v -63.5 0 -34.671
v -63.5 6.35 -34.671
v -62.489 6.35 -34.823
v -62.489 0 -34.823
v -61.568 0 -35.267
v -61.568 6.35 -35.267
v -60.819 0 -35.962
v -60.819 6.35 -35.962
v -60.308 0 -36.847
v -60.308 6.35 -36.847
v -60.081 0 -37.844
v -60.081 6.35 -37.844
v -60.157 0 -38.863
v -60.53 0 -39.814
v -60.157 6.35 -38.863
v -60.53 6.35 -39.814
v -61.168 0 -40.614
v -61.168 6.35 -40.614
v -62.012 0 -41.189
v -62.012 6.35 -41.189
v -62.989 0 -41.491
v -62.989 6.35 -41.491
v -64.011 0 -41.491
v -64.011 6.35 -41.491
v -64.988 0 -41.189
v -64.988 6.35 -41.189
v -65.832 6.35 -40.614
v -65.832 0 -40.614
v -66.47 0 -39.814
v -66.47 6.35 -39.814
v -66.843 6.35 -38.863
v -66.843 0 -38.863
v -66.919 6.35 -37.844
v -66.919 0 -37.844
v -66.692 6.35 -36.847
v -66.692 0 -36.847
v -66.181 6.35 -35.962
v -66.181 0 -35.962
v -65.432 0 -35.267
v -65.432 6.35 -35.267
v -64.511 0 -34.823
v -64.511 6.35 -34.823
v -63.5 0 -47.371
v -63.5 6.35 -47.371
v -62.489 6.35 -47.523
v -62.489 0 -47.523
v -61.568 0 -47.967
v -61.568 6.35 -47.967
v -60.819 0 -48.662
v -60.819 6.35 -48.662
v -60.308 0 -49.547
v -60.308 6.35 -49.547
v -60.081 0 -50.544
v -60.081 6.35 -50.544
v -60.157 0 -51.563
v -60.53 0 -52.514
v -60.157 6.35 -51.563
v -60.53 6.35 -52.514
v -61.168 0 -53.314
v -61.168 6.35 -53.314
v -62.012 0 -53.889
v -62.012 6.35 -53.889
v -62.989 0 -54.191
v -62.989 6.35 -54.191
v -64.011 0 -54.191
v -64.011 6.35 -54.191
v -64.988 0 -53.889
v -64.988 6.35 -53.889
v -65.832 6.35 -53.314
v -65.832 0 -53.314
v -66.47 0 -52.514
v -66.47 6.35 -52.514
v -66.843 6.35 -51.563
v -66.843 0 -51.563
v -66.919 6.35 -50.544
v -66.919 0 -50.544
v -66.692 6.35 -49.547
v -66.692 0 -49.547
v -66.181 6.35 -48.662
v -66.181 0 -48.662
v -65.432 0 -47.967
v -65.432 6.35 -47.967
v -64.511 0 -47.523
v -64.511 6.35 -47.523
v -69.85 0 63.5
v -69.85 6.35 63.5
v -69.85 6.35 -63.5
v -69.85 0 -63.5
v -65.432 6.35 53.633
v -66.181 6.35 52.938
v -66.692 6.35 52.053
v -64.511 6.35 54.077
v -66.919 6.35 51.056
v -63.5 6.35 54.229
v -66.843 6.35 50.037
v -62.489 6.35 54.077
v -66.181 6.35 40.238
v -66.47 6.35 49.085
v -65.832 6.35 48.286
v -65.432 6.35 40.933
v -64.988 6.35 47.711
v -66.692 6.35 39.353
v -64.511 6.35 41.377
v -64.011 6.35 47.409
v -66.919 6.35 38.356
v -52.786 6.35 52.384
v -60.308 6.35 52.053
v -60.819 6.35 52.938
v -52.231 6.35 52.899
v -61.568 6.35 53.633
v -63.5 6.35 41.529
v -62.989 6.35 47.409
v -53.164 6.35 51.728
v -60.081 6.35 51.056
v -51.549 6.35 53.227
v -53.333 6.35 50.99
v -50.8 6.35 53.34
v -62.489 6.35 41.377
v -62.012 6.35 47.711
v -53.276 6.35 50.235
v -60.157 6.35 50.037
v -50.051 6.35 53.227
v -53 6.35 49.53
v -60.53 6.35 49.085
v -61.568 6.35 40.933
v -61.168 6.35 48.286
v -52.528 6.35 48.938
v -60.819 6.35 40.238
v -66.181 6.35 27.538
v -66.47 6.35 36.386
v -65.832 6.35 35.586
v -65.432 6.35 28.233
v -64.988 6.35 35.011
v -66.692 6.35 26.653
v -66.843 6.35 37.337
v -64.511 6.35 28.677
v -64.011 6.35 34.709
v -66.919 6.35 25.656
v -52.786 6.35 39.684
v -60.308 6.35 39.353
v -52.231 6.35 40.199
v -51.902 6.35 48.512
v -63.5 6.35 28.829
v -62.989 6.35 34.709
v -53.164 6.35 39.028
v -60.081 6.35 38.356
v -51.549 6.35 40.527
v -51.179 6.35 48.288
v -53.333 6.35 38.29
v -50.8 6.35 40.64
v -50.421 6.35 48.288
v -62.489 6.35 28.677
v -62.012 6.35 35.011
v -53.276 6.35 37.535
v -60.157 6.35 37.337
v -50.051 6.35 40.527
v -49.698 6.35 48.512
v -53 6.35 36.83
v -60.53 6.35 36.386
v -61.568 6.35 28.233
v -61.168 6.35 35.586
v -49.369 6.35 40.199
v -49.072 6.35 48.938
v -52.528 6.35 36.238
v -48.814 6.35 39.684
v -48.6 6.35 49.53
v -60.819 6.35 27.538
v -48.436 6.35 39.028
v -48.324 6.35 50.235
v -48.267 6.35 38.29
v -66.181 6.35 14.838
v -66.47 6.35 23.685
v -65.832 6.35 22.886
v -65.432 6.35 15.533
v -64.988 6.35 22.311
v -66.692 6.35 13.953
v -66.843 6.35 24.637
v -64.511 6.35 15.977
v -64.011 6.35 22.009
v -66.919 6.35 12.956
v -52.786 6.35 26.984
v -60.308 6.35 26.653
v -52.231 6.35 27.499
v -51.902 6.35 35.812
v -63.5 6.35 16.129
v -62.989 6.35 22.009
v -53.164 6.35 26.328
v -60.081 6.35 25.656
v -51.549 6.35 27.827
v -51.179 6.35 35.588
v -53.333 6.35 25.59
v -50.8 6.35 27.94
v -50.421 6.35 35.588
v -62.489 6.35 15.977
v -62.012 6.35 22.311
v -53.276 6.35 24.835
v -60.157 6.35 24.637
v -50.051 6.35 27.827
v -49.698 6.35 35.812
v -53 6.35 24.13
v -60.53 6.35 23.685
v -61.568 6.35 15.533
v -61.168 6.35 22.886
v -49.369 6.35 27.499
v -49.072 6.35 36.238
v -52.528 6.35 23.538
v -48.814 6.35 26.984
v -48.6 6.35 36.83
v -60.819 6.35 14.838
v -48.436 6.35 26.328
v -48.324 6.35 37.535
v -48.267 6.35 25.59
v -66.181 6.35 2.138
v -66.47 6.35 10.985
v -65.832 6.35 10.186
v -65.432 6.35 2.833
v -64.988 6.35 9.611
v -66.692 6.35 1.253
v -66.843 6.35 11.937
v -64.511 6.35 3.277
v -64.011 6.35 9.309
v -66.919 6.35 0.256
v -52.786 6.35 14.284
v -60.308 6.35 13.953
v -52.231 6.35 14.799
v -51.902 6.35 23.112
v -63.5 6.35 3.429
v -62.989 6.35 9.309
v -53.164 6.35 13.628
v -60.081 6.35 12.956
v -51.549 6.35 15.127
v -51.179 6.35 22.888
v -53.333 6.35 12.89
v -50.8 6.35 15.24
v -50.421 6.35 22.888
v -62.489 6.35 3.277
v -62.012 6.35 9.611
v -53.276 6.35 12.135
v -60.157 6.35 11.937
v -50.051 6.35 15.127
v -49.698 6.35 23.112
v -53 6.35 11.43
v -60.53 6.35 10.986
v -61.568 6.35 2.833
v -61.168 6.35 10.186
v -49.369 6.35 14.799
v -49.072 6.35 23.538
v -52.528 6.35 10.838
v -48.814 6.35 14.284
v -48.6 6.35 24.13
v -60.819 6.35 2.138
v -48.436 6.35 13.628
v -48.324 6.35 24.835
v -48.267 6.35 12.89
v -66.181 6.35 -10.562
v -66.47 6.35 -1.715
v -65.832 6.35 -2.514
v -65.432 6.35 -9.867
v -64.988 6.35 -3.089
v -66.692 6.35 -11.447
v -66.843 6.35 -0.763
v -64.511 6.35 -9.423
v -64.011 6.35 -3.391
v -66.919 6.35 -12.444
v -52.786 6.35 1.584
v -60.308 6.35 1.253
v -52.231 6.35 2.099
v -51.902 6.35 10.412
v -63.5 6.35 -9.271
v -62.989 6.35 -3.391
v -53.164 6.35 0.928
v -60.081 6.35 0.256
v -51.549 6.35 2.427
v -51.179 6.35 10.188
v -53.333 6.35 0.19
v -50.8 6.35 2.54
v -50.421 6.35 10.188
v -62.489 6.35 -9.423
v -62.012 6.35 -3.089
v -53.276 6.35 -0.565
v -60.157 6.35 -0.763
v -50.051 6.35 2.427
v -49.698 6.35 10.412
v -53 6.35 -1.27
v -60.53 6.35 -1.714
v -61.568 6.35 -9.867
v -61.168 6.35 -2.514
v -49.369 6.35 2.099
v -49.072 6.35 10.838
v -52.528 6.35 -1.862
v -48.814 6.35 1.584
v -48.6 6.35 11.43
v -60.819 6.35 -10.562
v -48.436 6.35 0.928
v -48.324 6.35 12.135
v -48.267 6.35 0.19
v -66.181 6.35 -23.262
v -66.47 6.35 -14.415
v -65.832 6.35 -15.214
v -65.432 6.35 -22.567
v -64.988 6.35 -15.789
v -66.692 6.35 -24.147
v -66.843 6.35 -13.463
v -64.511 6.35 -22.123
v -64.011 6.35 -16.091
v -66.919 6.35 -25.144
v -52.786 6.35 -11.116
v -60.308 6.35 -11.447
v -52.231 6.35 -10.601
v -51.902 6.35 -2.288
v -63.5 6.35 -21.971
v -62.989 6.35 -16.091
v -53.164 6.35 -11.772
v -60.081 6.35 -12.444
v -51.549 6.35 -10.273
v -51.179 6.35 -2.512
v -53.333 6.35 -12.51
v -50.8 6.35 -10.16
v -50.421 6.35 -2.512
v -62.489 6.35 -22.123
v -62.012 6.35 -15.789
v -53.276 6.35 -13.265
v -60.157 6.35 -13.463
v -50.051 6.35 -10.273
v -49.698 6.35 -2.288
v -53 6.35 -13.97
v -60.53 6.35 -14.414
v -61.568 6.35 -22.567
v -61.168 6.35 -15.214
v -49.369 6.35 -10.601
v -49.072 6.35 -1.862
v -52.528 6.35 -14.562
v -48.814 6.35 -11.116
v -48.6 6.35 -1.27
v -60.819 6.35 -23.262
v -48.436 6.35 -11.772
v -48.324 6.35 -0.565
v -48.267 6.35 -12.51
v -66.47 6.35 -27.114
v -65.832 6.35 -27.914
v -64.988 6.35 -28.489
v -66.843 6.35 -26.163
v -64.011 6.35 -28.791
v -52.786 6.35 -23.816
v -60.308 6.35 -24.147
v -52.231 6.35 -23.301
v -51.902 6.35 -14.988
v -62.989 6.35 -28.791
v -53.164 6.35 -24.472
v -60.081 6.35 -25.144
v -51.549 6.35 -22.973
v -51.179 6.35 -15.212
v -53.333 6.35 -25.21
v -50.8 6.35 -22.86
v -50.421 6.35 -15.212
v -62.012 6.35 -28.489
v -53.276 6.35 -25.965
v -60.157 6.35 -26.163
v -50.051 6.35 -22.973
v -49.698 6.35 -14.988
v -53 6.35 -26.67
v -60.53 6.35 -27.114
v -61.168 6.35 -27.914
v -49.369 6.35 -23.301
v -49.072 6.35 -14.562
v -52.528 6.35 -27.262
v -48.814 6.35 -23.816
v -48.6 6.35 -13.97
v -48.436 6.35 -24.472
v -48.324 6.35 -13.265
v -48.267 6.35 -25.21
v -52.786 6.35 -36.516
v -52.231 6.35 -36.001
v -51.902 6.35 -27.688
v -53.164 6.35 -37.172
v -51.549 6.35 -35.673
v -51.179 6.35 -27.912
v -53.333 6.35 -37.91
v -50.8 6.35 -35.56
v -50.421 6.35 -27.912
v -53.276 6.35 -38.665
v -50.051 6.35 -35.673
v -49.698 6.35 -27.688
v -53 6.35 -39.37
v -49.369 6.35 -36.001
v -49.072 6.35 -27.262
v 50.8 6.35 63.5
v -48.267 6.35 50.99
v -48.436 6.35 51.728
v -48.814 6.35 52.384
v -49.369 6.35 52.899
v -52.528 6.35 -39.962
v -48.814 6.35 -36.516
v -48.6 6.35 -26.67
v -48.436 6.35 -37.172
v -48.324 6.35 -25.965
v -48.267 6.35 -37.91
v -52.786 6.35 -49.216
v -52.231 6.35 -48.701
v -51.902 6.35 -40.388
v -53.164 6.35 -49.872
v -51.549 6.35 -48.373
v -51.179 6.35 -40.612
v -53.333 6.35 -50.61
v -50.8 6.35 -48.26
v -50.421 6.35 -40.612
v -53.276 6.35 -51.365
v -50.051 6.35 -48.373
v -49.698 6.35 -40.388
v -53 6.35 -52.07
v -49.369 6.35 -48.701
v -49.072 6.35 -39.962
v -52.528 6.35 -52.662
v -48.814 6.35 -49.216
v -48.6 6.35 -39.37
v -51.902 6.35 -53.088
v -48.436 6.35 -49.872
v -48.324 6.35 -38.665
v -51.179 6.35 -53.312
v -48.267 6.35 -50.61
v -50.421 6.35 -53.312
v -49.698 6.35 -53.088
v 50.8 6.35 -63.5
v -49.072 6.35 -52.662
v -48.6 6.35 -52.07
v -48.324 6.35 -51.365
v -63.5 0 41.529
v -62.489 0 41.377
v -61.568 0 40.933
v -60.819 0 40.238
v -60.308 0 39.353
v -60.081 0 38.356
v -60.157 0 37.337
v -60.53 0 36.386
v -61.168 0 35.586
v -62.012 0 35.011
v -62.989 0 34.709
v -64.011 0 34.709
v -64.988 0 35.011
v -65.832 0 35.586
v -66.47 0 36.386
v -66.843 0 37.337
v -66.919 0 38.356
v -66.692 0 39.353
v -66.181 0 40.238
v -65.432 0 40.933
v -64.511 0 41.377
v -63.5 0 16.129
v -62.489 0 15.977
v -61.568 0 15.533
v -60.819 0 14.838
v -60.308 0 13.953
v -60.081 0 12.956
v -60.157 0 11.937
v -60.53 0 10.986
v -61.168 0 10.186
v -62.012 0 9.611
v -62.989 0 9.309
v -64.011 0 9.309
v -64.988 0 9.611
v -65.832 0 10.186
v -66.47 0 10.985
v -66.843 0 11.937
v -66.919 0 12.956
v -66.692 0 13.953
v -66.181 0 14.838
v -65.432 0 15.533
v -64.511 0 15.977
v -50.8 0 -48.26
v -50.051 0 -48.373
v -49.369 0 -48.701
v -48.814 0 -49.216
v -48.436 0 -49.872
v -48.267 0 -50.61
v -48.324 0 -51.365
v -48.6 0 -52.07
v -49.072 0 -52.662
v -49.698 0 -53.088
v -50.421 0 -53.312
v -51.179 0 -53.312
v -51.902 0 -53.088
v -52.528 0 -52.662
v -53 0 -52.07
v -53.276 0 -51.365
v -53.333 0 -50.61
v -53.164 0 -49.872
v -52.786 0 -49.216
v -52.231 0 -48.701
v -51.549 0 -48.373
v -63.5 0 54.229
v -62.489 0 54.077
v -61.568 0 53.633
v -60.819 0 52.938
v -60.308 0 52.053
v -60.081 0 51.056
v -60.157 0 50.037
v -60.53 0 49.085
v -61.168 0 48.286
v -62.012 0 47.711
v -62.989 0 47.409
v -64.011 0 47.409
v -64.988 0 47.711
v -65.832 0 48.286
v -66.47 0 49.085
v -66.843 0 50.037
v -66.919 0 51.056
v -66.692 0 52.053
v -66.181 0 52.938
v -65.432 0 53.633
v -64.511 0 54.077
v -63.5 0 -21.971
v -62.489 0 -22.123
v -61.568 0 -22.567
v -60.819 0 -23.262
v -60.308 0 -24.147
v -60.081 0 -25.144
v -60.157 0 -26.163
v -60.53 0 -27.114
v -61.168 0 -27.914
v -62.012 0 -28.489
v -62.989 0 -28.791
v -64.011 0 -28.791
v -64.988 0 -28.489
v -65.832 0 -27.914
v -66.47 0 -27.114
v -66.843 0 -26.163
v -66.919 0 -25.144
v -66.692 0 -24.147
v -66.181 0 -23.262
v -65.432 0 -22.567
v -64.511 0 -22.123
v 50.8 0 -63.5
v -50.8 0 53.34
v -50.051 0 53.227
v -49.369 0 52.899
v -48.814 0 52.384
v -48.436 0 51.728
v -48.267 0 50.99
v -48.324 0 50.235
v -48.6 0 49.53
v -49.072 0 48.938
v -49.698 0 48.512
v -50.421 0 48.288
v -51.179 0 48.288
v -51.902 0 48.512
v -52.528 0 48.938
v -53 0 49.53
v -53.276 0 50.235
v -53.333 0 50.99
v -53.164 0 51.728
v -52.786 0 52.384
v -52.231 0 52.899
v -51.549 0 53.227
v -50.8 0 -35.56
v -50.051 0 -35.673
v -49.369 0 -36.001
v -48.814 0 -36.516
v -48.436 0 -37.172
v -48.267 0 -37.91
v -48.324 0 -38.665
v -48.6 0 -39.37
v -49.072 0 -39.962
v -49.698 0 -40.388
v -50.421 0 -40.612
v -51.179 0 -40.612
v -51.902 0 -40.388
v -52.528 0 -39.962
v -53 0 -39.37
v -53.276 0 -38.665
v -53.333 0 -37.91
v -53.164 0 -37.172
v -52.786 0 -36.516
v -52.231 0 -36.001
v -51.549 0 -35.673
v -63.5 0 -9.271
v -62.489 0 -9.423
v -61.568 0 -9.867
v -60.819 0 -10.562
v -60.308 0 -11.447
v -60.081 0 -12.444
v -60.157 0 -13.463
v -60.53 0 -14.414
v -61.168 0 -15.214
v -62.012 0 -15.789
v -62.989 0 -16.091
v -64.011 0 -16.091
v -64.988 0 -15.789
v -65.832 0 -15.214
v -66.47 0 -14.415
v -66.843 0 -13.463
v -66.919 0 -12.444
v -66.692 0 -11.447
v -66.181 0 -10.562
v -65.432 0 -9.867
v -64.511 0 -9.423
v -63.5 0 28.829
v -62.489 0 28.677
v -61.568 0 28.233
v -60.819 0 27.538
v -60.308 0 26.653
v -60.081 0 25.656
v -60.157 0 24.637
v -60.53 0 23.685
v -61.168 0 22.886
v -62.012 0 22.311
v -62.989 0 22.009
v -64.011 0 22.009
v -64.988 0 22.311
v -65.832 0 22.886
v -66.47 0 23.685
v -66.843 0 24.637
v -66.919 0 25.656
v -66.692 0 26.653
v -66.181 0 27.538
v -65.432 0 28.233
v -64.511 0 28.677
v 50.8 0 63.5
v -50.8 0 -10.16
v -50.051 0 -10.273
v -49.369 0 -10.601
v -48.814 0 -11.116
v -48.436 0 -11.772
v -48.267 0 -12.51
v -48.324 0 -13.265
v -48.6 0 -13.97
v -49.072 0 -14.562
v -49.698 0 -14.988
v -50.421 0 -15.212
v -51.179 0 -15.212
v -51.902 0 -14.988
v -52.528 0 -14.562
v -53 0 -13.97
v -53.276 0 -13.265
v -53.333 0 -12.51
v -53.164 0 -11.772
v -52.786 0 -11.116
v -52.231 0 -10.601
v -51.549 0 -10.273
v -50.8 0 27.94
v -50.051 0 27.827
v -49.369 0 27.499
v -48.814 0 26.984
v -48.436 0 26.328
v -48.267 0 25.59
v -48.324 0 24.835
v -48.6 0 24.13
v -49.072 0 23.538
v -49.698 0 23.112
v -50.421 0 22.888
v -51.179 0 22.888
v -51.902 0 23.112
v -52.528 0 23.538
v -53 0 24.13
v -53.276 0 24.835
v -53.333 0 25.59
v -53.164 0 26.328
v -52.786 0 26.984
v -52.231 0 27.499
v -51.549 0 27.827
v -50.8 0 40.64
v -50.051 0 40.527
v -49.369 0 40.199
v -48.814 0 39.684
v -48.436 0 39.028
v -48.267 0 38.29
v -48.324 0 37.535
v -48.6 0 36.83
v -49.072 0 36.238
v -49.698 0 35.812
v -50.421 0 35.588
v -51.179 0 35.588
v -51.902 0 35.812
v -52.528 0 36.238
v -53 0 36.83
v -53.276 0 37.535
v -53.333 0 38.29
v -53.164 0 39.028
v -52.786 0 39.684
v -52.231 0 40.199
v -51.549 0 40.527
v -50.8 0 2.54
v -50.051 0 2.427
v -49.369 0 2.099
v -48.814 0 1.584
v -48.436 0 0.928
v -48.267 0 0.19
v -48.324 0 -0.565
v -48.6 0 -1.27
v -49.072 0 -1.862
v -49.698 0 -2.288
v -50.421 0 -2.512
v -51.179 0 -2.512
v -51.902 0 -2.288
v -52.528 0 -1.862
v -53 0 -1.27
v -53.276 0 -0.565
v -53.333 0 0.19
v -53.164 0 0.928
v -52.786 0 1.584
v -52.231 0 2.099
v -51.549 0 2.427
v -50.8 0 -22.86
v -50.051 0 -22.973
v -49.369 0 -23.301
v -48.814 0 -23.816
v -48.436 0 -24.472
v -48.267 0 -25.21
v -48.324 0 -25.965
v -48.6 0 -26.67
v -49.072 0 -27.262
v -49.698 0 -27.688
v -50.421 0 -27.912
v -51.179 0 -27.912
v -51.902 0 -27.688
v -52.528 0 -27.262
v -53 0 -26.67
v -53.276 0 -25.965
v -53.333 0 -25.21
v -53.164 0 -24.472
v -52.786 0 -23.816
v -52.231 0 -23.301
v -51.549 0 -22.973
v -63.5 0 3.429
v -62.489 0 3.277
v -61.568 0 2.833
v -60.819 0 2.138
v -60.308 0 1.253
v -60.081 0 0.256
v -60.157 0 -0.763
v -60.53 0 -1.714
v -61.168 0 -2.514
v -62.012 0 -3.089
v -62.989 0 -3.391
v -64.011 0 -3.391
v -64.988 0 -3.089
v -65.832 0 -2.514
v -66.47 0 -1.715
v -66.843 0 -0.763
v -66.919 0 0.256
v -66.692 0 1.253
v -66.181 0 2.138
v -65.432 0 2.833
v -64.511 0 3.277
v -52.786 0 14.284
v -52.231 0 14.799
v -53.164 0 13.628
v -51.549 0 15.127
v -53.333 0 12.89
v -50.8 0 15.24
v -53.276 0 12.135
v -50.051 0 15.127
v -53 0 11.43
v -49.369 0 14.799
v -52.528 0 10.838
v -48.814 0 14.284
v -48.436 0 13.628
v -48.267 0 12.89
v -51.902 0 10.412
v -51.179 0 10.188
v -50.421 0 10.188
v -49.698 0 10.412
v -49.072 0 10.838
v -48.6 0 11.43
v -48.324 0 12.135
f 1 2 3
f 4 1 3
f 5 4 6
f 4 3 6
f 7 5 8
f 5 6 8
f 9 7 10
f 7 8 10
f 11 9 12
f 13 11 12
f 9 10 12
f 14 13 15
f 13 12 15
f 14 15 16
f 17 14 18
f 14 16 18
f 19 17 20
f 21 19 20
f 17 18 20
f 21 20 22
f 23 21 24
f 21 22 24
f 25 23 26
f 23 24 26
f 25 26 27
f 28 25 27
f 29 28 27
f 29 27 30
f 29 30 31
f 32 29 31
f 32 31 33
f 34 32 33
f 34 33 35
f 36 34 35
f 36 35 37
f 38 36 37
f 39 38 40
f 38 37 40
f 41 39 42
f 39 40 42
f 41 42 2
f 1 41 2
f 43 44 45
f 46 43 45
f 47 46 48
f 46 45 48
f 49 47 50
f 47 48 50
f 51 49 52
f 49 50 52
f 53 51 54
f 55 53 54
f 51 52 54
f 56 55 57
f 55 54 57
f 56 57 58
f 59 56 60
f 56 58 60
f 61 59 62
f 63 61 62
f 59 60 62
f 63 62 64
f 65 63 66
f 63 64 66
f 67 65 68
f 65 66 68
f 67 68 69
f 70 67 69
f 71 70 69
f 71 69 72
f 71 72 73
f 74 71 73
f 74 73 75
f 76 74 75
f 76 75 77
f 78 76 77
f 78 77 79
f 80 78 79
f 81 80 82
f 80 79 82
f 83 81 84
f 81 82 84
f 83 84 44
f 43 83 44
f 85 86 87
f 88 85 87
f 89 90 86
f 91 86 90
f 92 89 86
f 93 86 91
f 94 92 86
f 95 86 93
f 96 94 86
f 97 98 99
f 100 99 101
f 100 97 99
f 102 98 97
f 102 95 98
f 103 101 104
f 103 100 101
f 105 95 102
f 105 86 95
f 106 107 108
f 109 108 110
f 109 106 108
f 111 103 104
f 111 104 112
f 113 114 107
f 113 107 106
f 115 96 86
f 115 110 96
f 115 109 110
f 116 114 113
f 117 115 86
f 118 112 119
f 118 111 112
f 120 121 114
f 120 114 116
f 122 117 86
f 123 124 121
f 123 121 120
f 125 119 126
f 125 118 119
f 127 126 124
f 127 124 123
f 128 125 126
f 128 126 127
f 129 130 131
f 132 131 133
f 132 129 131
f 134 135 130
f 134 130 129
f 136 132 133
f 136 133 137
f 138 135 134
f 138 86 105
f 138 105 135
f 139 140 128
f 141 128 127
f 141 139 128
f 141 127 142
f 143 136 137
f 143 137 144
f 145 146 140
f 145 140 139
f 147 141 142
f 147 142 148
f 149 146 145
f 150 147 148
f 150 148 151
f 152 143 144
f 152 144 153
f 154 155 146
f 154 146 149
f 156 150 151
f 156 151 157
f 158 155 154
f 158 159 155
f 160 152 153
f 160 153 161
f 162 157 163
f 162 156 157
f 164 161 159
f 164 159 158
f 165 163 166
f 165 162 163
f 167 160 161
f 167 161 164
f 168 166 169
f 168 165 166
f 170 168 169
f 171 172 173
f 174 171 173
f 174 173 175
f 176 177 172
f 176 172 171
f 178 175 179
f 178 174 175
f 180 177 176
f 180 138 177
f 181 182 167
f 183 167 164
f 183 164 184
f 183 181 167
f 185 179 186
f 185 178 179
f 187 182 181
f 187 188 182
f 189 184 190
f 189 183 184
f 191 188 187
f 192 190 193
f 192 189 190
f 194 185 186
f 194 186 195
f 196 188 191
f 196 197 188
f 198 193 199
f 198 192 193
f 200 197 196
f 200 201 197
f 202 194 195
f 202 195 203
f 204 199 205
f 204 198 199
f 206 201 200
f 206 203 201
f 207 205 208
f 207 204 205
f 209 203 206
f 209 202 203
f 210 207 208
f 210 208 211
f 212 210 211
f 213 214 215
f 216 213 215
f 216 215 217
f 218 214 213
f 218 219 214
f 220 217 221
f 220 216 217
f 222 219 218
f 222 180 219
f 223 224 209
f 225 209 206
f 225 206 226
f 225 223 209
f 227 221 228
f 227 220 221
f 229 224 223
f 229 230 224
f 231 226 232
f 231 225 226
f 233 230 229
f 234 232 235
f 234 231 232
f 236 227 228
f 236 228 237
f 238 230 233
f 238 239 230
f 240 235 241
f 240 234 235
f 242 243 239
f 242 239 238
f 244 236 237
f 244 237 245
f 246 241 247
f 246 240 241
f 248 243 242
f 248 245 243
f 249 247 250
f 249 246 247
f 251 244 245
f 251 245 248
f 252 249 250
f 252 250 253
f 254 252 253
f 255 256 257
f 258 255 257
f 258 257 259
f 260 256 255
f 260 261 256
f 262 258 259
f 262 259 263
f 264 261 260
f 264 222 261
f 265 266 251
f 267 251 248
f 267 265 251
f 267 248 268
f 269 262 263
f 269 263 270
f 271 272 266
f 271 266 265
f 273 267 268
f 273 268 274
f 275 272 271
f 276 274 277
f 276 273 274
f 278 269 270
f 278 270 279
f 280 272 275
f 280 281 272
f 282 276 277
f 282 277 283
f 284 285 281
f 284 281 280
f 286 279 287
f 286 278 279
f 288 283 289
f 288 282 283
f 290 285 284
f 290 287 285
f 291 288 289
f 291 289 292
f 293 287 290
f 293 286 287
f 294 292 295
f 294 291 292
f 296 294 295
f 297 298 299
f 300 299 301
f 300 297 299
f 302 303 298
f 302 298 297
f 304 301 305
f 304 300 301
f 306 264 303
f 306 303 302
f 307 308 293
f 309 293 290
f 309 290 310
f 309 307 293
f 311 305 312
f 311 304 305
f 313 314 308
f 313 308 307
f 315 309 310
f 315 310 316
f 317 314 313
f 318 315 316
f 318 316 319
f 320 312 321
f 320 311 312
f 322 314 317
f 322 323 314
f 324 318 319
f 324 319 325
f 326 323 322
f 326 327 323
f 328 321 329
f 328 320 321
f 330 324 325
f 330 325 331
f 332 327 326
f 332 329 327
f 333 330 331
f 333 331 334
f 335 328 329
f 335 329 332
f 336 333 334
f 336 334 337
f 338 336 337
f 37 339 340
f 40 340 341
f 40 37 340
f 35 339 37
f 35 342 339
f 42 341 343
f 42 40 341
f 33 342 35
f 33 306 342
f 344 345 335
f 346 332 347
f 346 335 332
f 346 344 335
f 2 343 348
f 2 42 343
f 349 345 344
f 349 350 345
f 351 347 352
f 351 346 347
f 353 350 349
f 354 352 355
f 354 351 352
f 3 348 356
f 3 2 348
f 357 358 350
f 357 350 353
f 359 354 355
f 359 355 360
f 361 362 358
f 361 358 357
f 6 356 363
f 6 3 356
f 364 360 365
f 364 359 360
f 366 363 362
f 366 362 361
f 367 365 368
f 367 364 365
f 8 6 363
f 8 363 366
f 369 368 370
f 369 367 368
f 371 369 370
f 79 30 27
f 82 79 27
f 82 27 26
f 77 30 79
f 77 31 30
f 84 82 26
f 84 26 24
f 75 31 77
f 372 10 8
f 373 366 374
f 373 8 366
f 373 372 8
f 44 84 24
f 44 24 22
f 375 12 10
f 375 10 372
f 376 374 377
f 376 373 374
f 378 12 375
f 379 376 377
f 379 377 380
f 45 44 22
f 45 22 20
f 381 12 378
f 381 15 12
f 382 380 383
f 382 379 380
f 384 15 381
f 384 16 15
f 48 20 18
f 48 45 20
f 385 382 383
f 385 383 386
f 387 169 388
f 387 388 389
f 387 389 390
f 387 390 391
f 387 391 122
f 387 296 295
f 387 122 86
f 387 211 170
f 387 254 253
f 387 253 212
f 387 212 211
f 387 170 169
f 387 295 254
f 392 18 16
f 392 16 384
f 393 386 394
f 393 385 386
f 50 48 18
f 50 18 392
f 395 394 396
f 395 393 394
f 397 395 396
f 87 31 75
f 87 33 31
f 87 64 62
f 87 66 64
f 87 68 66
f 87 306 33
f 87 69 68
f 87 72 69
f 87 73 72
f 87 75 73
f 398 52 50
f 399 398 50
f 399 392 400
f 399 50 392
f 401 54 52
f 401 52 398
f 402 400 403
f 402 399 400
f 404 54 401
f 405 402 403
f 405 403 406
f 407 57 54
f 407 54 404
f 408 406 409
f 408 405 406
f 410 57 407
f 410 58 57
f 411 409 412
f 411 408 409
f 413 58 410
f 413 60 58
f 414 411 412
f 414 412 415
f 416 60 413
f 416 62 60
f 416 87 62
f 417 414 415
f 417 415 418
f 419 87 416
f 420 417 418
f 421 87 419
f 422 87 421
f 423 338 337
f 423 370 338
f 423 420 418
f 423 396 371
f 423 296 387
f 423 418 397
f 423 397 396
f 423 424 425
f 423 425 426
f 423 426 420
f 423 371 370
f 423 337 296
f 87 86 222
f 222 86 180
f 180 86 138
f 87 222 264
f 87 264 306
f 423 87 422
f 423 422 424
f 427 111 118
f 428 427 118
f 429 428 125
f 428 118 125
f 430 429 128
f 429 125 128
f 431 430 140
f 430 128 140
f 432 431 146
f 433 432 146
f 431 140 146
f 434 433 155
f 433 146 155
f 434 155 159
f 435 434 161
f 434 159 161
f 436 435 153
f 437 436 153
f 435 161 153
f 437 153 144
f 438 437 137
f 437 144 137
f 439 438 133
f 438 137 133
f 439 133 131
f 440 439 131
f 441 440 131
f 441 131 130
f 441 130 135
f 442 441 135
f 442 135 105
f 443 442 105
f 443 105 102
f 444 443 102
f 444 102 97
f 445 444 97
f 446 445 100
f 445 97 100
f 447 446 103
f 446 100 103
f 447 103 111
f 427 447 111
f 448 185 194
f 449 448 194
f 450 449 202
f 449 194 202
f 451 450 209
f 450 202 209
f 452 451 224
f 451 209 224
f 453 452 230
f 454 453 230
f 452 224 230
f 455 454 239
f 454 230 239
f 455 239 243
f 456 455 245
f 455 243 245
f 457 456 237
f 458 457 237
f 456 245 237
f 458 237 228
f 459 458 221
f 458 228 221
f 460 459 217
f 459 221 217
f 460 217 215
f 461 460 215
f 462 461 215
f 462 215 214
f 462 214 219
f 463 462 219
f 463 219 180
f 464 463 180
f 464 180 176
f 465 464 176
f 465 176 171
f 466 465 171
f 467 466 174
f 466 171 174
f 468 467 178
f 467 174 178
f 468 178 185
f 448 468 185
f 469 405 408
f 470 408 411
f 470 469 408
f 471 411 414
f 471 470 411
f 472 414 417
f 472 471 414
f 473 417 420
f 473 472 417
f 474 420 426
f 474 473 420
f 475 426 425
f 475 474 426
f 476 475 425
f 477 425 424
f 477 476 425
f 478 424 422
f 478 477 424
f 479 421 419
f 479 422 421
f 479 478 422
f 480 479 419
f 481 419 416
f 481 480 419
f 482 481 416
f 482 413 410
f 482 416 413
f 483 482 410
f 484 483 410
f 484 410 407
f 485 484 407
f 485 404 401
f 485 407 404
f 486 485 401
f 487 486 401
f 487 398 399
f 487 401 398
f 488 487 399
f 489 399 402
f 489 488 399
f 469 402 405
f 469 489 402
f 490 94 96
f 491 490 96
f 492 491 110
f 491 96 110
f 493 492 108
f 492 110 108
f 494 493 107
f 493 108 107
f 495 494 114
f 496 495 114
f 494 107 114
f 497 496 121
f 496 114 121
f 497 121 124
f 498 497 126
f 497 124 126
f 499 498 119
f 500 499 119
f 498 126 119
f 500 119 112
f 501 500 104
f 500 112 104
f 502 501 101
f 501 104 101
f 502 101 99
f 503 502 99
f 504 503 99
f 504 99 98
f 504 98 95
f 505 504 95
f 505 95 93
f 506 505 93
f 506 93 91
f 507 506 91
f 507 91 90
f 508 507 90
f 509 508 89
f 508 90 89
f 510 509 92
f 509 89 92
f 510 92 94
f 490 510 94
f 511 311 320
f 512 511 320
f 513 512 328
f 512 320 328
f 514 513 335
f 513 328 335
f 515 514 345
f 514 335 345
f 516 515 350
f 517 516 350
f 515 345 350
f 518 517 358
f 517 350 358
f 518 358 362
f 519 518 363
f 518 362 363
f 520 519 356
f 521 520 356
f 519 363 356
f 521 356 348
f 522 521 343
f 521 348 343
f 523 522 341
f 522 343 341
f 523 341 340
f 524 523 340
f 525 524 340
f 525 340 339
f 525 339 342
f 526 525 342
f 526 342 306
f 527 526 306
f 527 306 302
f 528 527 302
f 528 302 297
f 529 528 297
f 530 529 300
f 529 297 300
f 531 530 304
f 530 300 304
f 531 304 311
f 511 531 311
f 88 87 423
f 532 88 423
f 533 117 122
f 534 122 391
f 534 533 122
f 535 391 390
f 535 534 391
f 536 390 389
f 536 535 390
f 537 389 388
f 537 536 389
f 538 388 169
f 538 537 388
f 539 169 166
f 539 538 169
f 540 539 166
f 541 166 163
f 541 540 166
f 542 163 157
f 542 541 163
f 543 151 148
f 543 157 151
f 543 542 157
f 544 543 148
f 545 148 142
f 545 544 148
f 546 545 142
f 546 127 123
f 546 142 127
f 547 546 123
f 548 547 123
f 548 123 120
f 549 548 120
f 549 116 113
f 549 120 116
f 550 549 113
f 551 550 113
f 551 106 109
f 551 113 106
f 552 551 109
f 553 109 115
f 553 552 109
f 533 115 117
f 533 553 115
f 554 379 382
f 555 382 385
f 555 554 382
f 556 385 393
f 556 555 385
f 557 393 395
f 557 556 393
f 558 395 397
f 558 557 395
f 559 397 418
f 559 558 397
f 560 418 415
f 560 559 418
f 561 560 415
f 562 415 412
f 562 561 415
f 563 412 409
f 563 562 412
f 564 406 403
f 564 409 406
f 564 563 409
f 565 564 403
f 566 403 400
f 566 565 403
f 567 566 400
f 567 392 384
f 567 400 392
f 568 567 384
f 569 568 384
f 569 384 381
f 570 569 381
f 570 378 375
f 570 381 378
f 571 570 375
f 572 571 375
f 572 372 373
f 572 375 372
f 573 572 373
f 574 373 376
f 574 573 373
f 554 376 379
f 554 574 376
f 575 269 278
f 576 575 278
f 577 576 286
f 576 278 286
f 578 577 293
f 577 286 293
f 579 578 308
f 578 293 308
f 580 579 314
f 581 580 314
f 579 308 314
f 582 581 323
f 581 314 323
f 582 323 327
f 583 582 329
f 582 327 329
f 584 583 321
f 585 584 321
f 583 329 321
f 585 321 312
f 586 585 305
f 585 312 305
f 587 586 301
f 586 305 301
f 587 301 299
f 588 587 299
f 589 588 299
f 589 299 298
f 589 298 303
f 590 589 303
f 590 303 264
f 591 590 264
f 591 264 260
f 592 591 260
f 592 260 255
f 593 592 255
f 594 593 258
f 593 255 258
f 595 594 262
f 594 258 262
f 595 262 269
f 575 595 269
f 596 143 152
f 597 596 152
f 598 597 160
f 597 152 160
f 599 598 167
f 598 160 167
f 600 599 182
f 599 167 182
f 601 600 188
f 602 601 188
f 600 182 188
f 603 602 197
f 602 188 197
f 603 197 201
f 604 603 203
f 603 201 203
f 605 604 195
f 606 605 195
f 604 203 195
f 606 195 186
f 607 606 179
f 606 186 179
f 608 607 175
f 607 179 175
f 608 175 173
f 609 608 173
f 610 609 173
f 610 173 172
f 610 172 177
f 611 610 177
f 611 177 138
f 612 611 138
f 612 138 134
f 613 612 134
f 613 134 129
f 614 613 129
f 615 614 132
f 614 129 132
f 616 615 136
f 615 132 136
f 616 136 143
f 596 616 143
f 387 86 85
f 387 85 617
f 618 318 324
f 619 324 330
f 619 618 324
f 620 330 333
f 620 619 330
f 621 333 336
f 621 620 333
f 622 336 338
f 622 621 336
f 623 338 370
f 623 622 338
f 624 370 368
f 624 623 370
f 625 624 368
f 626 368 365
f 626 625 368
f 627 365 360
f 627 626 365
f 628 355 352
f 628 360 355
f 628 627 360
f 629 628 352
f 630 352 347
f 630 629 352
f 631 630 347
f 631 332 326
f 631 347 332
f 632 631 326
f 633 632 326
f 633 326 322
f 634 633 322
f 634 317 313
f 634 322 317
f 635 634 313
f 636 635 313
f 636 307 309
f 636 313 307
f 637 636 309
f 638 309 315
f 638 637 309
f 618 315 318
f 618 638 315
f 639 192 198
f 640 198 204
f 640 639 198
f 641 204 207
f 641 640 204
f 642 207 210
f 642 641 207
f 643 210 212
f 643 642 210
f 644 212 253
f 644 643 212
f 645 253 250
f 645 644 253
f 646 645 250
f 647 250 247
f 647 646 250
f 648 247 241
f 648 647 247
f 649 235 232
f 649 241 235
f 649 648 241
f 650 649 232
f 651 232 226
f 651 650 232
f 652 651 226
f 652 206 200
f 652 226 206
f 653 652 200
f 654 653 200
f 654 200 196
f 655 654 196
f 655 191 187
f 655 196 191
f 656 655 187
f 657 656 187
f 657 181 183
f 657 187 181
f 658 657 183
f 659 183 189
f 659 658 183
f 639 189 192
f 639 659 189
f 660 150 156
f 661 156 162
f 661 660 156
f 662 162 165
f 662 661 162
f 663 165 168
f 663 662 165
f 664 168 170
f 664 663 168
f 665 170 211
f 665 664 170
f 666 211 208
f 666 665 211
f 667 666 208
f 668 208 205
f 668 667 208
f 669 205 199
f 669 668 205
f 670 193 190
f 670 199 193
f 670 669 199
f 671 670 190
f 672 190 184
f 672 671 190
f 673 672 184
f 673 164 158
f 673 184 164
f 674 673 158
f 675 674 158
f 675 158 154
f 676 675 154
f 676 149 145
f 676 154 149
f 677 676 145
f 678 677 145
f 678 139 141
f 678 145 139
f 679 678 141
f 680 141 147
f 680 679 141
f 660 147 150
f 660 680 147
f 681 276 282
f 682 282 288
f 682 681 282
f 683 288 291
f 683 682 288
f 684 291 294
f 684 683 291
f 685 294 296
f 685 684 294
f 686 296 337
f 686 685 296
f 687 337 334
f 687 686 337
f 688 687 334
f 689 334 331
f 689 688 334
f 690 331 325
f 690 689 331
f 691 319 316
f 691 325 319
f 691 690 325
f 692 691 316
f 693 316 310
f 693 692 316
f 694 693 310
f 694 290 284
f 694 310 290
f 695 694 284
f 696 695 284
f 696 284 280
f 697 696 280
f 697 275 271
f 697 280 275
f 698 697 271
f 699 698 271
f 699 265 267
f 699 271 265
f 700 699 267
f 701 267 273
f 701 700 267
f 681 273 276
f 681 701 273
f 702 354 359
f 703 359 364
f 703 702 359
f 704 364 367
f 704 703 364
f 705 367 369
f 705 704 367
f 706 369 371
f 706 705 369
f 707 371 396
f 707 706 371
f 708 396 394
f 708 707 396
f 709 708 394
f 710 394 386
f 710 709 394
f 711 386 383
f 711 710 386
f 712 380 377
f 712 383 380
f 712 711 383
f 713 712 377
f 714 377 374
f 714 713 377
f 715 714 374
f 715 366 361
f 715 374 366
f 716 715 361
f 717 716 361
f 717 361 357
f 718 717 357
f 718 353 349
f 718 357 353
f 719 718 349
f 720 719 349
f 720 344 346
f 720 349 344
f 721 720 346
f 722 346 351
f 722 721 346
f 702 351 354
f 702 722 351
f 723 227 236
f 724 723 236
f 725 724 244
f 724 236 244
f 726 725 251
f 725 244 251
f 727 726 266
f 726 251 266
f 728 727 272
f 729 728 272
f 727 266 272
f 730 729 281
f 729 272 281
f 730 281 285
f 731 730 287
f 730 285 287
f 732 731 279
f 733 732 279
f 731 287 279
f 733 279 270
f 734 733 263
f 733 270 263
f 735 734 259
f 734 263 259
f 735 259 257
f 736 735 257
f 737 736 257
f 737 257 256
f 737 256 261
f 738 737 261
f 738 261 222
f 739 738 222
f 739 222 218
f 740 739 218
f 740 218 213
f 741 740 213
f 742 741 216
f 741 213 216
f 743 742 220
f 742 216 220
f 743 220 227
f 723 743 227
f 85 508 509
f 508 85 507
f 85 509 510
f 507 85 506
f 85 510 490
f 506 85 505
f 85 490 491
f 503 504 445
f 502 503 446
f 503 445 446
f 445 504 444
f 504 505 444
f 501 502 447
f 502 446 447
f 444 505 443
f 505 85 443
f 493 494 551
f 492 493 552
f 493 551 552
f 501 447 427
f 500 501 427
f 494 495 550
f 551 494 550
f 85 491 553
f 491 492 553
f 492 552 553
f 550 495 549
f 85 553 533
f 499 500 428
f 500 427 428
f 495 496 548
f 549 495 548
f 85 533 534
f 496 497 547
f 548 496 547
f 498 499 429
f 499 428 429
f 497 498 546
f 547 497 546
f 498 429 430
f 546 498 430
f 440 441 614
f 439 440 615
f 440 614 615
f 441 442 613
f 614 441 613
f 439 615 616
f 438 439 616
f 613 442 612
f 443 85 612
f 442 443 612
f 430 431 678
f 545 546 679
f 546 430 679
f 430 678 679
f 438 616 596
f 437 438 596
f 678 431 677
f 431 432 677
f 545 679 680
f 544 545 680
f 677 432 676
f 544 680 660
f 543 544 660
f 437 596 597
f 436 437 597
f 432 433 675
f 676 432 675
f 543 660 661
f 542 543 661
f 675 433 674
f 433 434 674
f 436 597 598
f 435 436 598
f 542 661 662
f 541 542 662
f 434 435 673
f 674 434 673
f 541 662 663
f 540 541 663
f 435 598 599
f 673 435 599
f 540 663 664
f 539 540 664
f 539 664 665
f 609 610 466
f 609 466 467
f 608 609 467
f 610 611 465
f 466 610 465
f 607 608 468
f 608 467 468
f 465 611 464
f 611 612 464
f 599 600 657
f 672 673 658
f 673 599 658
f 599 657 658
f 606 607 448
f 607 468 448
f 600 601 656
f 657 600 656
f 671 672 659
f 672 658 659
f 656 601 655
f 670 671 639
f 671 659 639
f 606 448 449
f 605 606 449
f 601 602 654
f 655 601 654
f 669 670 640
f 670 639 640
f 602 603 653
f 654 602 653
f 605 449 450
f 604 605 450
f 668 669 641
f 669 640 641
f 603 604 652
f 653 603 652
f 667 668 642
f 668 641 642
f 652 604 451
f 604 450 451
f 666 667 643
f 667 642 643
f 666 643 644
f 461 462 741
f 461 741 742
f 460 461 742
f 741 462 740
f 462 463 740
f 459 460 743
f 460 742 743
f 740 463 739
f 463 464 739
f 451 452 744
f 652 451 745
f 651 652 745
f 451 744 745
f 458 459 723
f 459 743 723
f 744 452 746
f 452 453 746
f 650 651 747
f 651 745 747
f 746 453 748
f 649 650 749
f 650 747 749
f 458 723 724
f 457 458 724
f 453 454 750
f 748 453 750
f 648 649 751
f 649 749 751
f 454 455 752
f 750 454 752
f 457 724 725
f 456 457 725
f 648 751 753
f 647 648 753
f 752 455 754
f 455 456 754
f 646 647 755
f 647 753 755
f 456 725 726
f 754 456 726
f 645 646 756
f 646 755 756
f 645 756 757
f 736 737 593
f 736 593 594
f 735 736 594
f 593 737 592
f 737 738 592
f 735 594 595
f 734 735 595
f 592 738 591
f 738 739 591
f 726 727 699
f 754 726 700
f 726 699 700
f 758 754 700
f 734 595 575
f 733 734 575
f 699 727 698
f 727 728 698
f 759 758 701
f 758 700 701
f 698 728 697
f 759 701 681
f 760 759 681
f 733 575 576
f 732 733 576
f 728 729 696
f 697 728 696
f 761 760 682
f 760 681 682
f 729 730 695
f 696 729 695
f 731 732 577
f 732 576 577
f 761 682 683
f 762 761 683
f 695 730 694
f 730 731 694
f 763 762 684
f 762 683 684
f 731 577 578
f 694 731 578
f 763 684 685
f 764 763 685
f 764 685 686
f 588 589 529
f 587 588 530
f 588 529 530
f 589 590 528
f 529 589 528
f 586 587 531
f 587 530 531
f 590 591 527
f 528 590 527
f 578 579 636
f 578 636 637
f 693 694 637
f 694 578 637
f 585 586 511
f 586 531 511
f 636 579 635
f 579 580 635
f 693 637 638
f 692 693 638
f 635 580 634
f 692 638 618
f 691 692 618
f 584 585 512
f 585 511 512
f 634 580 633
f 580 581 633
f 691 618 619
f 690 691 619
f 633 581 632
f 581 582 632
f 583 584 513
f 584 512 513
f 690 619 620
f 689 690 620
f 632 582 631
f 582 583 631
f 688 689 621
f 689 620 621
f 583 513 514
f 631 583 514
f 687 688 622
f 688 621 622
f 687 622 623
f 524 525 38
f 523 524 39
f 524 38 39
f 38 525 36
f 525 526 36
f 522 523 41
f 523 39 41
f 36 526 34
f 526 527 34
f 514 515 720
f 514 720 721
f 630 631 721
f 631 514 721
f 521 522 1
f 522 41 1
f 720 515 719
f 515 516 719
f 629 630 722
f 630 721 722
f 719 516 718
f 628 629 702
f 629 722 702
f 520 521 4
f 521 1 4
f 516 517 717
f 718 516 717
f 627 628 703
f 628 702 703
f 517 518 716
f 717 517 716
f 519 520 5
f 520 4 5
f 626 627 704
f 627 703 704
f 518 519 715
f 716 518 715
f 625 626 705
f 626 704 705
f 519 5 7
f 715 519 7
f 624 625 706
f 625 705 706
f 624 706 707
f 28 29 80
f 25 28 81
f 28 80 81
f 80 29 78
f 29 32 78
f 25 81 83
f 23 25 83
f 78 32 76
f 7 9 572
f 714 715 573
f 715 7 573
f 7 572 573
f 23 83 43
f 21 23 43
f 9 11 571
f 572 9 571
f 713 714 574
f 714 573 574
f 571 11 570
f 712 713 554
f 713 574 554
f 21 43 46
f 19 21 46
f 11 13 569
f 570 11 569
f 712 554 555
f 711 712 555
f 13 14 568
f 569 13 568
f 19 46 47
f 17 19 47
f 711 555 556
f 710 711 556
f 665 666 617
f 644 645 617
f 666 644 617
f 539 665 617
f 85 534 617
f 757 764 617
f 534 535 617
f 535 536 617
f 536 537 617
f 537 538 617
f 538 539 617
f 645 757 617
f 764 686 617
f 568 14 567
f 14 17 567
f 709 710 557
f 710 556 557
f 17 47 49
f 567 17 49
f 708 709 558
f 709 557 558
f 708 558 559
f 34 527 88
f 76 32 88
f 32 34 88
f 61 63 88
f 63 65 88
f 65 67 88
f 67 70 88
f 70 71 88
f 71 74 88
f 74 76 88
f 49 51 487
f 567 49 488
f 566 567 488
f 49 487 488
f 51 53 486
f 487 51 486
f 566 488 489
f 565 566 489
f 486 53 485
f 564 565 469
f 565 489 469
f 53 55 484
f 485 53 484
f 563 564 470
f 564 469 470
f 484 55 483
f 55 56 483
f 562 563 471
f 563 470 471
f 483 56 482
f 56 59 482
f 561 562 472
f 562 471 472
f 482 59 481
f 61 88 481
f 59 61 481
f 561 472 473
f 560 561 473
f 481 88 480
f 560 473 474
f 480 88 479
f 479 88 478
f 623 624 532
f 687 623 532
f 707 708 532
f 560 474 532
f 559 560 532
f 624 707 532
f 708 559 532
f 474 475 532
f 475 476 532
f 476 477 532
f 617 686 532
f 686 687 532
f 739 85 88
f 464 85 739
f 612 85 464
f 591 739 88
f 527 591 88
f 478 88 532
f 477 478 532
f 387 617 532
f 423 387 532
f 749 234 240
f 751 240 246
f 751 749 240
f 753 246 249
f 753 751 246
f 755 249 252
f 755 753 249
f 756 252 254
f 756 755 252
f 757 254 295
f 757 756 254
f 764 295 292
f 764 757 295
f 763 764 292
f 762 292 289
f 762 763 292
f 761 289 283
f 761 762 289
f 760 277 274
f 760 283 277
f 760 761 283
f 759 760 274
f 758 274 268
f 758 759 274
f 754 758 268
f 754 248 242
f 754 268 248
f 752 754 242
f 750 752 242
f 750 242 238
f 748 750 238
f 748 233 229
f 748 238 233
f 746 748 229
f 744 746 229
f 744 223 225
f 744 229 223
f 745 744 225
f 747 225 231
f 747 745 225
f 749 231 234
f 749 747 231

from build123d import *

# Parameters (mm, degrees)
SKETCH1_W           = 101.6
SKETCH1_H           = 127
BOSS_EXTRUDE1_DEPTH = 6.35
SKETCH3_W           = 63.5
SKETCH3_H           = 127
SKETCH3_R           = 3.429
BOSS_EXTRUDE2_DEPTH = 6.35
SKETCH4_W           = 44.45
SKETCH4_H           = 127
CUT_EXTRUDE2_DEPTH  = 131.908603613
SKETCH5_R           = 2.54
CUT_EXTRUDE4_DEPTH  = 95.612869104


with BuildPart() as part:
    # Sketch1 → Boss-Extrude1 (new body)
    with BuildSketch(Plane(origin=(0, 0, 0), x_dir=(1, 0, 0), z_dir=(0, 1, 0))):
        Rectangle(SKETCH1_W, SKETCH1_H)
    extrude(amount=BOSS_EXTRUDE1_DEPTH)

    # Sketch3 → Boss-Extrude2 (add)
    with BuildSketch(Plane(origin=(0, 6.35, 0), x_dir=(1, 0, 0), z_dir=(0, 1, 0))):
        with Locations((-82.55, 0)):
            Rectangle(SKETCH3_W, SKETCH3_H)
        with Locations(Location((-101.6, 50.8, 0), (0, 0, 270))):
            Circle(SKETCH3_R, mode=Mode.SUBTRACT)
        with Locations(Location((-88.9, 50.8, 0), (0, 0, 270))):
            Circle(SKETCH3_R, mode=Mode.SUBTRACT)
        with Locations(Location((-88.9, 38.1, 0), (0, 0, 270))):
            Circle(SKETCH3_R, mode=Mode.SUBTRACT)
        with Locations(Location((-101.6, 38.1, 0), (0, 0, 270))):
            Circle(SKETCH3_R, mode=Mode.SUBTRACT)
        with Locations(Location((-101.6, 25.4, 0), (0, 0, 270))):
            Circle(SKETCH3_R, mode=Mode.SUBTRACT)
        with Locations(Location((-88.9, 25.4, 0), (0, 0, 270))):
            Circle(SKETCH3_R, mode=Mode.SUBTRACT)
        with Locations(Location((-76.2, 50.8, 0), (0, 0, 270))):
            Circle(SKETCH3_R, mode=Mode.SUBTRACT)
        with Locations(Location((-63.5, 50.8, 0), (0, 0, 270))):
            Circle(SKETCH3_R, mode=Mode.SUBTRACT)
        with Locations(Location((-76.2, 38.1, 0), (0, 0, 270))):
            Circle(SKETCH3_R, mode=Mode.SUBTRACT)
        with Locations(Location((-63.5, 38.1, 0), (0, 0, 270))):
            Circle(SKETCH3_R, mode=Mode.SUBTRACT)
        with Locations(Location((-76.2, 25.4, 0), (0, 0, 270))):
            Circle(SKETCH3_R, mode=Mode.SUBTRACT)
        with Locations(Location((-63.5, 25.4, 0), (0, 0, 270))):
            Circle(SKETCH3_R, mode=Mode.SUBTRACT)
        with Locations(Location((-101.6, 12.7, 0), (0, 0, 270))):
            Circle(SKETCH3_R, mode=Mode.SUBTRACT)
        with Locations(Location((-88.9, 12.7, 0), (0, 0, 270))):
            Circle(SKETCH3_R, mode=Mode.SUBTRACT)
        with Locations(Location((-76.2, 12.7, 0), (0, 0, 270))):
            Circle(SKETCH3_R, mode=Mode.SUBTRACT)
        with Locations(Location((-63.5, 12.7, 0), (0, 0, 270))):
            Circle(SKETCH3_R, mode=Mode.SUBTRACT)
        with Locations(Location((-101.6, 0, 0), (0, 0, 270))):
            Circle(SKETCH3_R, mode=Mode.SUBTRACT)
        with Locations(Location((-88.9, 0, 0), (0, 0, 270))):
            Circle(SKETCH3_R, mode=Mode.SUBTRACT)
        with Locations(Location((-76.2, 0, 0), (0, 0, 270))):
            Circle(SKETCH3_R, mode=Mode.SUBTRACT)
        with Locations(Location((-63.5, 0, 0), (0, 0, 270))):
            Circle(SKETCH3_R, mode=Mode.SUBTRACT)
        with Locations(Location((-101.6, -12.7, 0), (0, 0, 270))):
            Circle(SKETCH3_R, mode=Mode.SUBTRACT)
        with Locations(Location((-88.9, -12.7, 0), (0, 0, 270))):
            Circle(SKETCH3_R, mode=Mode.SUBTRACT)
        with Locations(Location((-76.2, -12.7, 0), (0, 0, 270))):
            Circle(SKETCH3_R, mode=Mode.SUBTRACT)
        with Locations(Location((-63.5, -12.7, 0), (0, 0, 270))):
            Circle(SKETCH3_R, mode=Mode.SUBTRACT)
        with Locations(Location((-101.6, -25.4, 0), (0, 0, 270))):
            Circle(SKETCH3_R, mode=Mode.SUBTRACT)
        with Locations(Location((-88.9, -25.4, 0), (0, 0, 270))):
            Circle(SKETCH3_R, mode=Mode.SUBTRACT)
        with Locations(Location((-76.2, -25.4, 0), (0, 0, 270))):
            Circle(SKETCH3_R, mode=Mode.SUBTRACT)
        with Locations(Location((-63.5, -25.4, 0), (0, 0, 270))):
            Circle(SKETCH3_R, mode=Mode.SUBTRACT)
        with Locations(Location((-101.6, -38.1, 0), (0, 0, 270))):
            Circle(SKETCH3_R, mode=Mode.SUBTRACT)
        with Locations(Location((-88.9, -38.1, 0), (0, 0, 270))):
            Circle(SKETCH3_R, mode=Mode.SUBTRACT)
        with Locations(Location((-76.2, -38.1, 0), (0, 0, 270))):
            Circle(SKETCH3_R, mode=Mode.SUBTRACT)
        with Locations(Location((-63.5, -38.1, 0), (0, 0, 270))):
            Circle(SKETCH3_R, mode=Mode.SUBTRACT)
        with Locations(Location((-101.6, -50.8, 0), (0, 0, 270))):
            Circle(SKETCH3_R, mode=Mode.SUBTRACT)
        with Locations(Location((-88.9, -50.8, 0), (0, 0, 270))):
            Circle(SKETCH3_R, mode=Mode.SUBTRACT)
        with Locations(Location((-76.2, -50.8, 0), (0, 0, 270))):
            Circle(SKETCH3_R, mode=Mode.SUBTRACT)
        with Locations(Location((-63.5, -50.8, 0), (0, 0, 270))):
            Circle(SKETCH3_R, mode=Mode.SUBTRACT)
    extrude(amount=-BOSS_EXTRUDE2_DEPTH)

    # Sketch4 → Cut-Extrude2 (cut, through all)
    with BuildSketch(Plane(origin=(0, 6.35, 0), x_dir=(1, 0, 0), z_dir=(0, 1, 0))):
        with Locations((-92.075, 0)):
            Rectangle(SKETCH4_W, SKETCH4_H)
    extrude(amount=-CUT_EXTRUDE2_DEPTH, mode=Mode.SUBTRACT)

    # Sketch5 → Cut-Extrude4 (cut, through all)
    with BuildSketch(Plane(origin=(0, 0, 0), x_dir=(1, 0, 0), z_dir=(0, 1, 0))):
        with Locations(Location((-50.8, 50.8, 0), (0, 0, 270))):
            Circle(SKETCH5_R)
        with Locations(Location((-50.8, 38.1, 0), (0, 0, 270))):
            Circle(SKETCH5_R)
        with Locations(Location((-50.8, 25.4, 0), (0, 0, 270))):
            Circle(SKETCH5_R)
        with Locations(Location((-50.8, 12.7, 0), (0, 0, 270))):
            Circle(SKETCH5_R)
        with Locations(Location((-50.8, 0, 0), (0, 0, 270))):
            Circle(SKETCH5_R)
        with Locations(Location((-50.8, -12.7, 0), (0, 0, 270))):
            Circle(SKETCH5_R)
        with Locations(Location((-50.8, -25.4, 0), (0, 0, 270))):
            Circle(SKETCH5_R)
        with Locations(Location((-50.8, -38.1, 0), (0, 0, 270))):
            Circle(SKETCH5_R)
        with Locations(Location((-50.8, -50.8, 0), (0, 0, 270))):
            Circle(SKETCH5_R)
    extrude(amount=CUT_EXTRUDE4_DEPTH, mode=Mode.SUBTRACT)


solid = part.part
